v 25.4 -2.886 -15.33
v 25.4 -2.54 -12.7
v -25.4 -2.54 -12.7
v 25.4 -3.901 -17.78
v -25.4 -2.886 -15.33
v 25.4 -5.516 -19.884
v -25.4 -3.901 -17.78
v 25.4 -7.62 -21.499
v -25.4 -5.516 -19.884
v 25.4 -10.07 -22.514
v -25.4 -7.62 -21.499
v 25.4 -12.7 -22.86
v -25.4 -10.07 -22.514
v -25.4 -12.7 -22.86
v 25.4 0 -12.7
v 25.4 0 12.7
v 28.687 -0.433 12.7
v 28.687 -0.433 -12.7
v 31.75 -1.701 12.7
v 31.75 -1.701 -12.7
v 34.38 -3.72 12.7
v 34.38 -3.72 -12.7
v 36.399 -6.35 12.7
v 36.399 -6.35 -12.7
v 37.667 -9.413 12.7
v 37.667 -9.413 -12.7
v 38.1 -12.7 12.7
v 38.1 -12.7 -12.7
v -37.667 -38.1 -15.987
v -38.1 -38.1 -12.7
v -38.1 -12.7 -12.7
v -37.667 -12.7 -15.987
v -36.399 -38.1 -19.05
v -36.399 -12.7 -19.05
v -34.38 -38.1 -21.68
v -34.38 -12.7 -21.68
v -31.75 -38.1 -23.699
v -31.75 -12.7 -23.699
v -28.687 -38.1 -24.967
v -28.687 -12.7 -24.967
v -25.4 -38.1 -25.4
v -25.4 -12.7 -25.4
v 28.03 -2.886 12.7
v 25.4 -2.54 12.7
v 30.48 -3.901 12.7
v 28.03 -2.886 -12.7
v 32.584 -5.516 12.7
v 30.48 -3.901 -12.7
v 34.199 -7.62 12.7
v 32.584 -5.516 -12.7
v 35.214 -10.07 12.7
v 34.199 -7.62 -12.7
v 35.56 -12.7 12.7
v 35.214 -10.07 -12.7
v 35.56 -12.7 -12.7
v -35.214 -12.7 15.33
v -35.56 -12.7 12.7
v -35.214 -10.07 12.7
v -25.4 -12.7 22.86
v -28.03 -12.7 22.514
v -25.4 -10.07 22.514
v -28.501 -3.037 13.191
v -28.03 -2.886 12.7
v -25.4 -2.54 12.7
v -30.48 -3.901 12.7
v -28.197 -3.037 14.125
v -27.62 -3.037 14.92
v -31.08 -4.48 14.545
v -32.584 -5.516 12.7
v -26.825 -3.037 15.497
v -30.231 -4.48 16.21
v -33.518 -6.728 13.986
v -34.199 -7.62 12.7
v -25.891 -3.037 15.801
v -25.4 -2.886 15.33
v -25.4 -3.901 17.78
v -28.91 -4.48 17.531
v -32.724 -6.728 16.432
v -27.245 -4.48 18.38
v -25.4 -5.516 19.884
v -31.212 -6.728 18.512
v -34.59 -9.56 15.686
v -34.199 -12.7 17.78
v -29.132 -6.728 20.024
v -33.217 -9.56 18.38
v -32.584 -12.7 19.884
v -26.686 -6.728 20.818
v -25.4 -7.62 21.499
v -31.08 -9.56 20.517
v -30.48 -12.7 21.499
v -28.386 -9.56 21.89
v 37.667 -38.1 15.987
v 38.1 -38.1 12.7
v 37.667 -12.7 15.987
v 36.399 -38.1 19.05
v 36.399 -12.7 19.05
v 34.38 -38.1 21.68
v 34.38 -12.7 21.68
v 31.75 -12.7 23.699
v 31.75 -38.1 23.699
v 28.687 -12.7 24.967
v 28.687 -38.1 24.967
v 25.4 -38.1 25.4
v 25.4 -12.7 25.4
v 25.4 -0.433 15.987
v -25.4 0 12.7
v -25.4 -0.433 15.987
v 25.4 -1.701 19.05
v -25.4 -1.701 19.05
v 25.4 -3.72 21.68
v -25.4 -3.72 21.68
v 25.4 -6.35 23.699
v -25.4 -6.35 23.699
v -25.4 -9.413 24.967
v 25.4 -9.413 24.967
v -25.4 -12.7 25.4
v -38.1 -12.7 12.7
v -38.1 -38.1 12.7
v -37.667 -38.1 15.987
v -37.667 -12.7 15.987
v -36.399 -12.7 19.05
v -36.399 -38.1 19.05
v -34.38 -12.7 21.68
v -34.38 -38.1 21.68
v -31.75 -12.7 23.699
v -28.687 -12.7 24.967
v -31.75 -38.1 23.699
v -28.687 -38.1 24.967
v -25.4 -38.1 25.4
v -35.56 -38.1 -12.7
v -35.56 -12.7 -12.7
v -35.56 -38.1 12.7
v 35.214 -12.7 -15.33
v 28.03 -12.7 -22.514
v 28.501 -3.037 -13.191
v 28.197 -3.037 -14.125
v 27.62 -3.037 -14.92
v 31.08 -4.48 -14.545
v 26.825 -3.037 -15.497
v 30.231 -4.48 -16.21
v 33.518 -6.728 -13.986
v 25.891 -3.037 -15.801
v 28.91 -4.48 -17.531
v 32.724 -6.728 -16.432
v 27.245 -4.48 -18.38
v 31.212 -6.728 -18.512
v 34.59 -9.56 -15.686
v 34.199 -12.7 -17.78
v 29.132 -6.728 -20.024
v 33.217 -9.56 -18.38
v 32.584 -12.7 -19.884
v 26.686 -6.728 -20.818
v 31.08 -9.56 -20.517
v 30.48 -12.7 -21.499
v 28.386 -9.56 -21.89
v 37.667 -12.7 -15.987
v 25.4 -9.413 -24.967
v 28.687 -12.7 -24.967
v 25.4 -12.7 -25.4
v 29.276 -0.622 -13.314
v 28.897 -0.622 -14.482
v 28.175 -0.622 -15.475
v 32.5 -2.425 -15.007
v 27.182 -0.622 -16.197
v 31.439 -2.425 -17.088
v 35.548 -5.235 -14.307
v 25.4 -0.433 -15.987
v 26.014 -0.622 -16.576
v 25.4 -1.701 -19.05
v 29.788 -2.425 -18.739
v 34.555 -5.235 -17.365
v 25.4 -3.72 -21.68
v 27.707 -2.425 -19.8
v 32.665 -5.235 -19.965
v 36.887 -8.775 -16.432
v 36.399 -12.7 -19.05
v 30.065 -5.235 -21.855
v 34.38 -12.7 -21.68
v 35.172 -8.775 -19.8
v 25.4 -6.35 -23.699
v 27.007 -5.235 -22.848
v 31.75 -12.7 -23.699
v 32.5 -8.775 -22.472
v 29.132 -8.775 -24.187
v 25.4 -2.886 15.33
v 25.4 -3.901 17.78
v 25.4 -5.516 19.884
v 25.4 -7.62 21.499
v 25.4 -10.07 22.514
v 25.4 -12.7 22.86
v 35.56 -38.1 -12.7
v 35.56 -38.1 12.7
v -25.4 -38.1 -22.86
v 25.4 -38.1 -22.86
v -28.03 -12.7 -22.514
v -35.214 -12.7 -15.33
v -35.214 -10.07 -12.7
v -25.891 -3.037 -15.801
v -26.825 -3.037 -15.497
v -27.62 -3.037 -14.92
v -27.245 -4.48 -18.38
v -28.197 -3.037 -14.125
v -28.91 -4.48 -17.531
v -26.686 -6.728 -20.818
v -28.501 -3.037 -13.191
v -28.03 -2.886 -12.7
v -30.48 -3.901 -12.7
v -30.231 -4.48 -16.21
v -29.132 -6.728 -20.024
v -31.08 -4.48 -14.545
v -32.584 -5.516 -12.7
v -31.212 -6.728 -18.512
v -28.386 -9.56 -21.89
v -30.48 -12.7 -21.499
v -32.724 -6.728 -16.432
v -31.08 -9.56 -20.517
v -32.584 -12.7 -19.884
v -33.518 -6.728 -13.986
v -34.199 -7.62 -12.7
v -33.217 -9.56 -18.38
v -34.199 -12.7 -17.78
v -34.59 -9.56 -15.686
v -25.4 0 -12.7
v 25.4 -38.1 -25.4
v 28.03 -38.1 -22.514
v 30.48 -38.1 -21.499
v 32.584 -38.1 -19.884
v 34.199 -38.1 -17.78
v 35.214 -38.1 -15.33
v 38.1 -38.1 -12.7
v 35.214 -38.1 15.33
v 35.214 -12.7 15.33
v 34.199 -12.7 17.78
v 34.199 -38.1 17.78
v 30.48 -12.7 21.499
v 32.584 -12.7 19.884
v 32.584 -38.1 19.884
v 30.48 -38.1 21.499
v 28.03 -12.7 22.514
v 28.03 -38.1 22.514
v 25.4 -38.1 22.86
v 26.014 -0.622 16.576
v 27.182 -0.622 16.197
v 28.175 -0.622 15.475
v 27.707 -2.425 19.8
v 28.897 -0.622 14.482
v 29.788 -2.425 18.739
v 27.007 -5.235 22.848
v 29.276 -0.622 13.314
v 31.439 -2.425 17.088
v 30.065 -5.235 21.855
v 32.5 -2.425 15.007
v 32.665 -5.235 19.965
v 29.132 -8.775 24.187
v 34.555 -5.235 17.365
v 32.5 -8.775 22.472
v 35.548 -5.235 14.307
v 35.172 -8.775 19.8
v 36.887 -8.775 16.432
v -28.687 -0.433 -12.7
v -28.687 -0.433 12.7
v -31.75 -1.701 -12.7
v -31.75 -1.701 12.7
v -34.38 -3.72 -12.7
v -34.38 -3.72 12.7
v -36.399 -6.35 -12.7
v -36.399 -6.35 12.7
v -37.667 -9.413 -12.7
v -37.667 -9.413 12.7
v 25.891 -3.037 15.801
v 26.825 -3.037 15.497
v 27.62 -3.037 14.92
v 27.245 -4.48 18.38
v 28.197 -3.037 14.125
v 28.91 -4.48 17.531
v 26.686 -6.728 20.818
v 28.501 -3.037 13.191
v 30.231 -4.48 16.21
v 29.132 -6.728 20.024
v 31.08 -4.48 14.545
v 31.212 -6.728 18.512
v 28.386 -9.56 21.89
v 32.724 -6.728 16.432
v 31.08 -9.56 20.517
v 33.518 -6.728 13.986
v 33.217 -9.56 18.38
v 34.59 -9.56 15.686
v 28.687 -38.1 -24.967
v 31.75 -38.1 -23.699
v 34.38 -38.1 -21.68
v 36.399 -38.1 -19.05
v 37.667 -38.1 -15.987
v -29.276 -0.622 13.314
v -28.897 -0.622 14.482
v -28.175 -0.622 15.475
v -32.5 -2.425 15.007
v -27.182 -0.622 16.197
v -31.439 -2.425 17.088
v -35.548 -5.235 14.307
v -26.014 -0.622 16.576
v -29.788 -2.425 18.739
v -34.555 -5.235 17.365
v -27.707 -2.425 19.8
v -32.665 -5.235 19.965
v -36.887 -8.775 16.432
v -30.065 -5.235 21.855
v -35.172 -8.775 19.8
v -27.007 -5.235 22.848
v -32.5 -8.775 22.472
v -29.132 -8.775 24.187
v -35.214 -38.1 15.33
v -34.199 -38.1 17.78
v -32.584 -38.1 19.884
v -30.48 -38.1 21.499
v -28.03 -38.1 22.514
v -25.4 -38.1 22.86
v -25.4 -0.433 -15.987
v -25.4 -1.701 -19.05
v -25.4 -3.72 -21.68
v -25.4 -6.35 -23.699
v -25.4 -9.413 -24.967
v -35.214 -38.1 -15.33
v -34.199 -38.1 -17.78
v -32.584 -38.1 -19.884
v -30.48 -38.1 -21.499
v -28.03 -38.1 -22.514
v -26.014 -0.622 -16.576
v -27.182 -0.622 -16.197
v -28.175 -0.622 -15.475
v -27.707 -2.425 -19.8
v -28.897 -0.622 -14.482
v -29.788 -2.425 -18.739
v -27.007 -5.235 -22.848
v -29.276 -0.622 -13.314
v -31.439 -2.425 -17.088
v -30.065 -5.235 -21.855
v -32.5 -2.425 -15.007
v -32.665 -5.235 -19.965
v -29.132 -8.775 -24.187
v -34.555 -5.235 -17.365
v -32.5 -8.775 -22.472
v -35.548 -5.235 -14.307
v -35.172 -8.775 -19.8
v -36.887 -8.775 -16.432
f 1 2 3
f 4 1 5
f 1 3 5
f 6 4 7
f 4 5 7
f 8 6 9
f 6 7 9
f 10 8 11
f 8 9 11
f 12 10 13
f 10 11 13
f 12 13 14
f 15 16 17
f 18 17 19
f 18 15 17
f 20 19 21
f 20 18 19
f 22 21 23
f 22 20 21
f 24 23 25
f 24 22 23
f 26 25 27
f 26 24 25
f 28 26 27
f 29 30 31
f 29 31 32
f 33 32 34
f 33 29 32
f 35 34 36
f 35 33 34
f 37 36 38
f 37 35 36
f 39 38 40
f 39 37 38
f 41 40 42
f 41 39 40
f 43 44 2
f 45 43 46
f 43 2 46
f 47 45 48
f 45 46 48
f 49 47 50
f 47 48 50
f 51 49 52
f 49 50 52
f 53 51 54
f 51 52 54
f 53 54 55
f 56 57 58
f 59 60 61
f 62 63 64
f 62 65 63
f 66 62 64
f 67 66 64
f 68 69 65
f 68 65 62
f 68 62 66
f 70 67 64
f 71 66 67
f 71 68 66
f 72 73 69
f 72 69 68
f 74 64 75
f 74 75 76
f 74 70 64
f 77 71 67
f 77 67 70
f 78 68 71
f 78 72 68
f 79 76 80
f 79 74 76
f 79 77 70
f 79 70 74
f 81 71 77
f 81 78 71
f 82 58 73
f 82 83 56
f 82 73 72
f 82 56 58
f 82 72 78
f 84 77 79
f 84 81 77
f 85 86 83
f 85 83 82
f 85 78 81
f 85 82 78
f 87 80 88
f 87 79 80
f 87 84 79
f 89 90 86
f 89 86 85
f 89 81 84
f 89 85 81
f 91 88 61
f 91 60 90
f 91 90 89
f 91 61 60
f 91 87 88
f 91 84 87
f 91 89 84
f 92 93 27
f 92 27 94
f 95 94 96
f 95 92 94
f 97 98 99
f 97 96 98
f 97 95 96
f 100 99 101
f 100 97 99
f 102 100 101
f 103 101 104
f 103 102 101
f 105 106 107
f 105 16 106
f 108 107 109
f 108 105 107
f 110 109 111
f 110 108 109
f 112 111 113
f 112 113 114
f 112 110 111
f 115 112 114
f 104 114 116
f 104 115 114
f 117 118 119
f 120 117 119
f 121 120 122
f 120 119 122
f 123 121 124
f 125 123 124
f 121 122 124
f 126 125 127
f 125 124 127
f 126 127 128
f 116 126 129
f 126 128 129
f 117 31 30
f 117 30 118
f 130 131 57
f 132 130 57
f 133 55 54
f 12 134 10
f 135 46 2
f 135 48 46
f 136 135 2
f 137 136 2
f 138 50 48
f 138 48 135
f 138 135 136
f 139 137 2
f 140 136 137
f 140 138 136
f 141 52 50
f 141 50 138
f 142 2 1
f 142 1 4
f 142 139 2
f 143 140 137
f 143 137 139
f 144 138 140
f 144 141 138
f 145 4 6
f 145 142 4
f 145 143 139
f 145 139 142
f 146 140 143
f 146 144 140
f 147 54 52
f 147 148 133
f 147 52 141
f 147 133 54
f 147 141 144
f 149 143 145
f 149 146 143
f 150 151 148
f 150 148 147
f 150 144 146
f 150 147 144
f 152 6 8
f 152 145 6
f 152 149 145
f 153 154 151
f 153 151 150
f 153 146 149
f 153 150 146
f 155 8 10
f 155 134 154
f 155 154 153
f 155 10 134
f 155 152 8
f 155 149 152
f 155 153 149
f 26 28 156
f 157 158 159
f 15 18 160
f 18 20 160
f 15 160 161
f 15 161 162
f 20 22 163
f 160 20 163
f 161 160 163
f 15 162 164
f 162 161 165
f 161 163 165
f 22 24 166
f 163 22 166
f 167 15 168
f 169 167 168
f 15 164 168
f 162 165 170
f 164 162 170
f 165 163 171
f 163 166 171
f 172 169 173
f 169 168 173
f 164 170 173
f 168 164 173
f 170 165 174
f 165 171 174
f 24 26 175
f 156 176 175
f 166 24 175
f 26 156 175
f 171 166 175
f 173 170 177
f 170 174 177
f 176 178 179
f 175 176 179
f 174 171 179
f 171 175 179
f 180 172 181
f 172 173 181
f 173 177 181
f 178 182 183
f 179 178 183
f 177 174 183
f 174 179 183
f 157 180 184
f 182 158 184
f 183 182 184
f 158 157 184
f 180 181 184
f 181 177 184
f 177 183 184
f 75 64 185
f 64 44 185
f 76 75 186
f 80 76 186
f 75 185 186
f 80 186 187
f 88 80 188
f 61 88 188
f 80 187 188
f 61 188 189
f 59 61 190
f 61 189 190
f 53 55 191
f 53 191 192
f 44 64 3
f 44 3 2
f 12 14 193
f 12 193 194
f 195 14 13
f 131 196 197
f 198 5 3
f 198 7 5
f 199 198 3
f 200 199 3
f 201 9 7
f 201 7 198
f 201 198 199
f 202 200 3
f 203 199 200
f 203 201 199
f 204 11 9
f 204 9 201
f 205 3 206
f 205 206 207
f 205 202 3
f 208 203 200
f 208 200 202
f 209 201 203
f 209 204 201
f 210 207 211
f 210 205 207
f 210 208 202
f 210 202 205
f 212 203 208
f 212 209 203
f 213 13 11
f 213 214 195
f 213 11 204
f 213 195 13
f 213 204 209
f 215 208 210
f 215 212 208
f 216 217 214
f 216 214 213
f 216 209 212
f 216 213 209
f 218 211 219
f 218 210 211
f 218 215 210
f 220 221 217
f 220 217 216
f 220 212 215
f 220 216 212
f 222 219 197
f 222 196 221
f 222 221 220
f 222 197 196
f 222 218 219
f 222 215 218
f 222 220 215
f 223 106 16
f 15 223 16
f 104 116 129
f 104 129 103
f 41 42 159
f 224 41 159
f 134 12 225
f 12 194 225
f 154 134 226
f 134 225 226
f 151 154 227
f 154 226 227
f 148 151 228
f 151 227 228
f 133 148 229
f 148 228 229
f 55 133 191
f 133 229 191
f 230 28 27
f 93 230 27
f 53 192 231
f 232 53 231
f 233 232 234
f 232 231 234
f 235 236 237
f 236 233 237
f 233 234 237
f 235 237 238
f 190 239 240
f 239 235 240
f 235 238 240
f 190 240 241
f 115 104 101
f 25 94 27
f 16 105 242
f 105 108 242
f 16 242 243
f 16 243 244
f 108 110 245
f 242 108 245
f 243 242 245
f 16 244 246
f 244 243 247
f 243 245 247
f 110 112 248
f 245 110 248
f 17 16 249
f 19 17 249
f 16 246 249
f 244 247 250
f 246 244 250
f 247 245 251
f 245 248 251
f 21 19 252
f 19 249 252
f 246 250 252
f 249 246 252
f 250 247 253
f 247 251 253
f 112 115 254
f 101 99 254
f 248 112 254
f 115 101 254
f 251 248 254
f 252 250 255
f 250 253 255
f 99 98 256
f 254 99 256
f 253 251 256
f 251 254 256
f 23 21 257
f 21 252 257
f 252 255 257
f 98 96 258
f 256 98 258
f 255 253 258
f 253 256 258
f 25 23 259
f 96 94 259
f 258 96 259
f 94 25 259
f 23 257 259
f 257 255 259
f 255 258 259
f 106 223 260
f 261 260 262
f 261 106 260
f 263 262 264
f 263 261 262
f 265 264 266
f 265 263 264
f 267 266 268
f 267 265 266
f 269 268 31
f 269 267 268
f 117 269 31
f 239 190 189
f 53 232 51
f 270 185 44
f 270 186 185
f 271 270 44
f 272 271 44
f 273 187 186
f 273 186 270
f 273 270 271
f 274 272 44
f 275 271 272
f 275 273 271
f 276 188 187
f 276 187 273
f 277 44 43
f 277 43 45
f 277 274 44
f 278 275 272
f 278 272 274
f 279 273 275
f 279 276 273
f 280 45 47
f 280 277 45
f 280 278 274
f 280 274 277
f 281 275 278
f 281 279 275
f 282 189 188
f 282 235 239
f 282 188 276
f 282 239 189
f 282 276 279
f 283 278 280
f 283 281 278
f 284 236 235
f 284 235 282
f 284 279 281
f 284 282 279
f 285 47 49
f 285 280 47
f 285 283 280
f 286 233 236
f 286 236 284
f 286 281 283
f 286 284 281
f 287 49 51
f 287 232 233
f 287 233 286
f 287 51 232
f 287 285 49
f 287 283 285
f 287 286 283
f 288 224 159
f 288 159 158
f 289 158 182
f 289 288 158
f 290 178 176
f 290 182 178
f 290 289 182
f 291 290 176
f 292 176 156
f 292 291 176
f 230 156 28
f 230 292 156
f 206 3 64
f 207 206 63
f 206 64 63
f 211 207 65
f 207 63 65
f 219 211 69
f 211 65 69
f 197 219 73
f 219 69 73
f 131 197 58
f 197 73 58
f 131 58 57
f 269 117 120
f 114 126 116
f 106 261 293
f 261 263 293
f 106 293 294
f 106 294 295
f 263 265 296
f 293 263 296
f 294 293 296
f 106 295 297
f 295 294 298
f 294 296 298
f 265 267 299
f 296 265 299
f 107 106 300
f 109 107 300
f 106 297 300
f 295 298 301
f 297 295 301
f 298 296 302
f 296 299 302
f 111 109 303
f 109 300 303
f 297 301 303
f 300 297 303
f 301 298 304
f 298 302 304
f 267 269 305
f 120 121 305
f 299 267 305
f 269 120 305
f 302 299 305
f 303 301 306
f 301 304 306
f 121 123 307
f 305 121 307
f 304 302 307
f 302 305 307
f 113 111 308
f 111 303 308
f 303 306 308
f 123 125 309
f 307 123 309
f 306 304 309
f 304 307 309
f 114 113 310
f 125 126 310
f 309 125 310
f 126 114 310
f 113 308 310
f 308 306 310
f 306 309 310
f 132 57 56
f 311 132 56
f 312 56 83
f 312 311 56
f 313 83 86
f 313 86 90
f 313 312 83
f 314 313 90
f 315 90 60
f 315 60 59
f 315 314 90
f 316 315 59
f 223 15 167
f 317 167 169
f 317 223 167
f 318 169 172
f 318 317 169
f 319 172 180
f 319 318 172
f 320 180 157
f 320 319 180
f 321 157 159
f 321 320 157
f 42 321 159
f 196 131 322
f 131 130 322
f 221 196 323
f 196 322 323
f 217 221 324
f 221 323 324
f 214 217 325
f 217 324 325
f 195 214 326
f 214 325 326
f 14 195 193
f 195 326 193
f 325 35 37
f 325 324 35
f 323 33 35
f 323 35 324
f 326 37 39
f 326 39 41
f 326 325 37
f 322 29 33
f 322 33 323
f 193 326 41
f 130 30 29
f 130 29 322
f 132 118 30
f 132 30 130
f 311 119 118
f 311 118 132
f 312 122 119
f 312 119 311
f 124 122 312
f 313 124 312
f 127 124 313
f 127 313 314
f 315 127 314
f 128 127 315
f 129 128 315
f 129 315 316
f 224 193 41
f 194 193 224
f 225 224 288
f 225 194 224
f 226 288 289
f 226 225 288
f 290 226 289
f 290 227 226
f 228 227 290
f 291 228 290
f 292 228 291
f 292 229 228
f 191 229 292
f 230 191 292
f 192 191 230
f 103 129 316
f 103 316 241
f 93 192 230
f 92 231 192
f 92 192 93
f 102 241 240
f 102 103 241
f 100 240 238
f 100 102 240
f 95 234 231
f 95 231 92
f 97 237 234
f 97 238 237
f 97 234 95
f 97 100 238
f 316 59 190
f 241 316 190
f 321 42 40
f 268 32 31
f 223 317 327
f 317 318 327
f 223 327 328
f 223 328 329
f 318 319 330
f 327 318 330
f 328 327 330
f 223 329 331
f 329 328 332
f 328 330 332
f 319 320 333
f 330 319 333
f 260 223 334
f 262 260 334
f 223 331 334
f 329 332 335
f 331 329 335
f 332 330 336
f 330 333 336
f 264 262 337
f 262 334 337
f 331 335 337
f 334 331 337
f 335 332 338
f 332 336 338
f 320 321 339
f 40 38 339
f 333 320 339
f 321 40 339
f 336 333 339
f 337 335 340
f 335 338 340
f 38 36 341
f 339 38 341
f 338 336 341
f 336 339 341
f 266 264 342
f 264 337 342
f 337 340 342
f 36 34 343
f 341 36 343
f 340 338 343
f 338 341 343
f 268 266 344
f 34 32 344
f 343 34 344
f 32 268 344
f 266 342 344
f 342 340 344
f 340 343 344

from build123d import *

# Parameters (mm, degrees)
F0_W     = 76.2
F0_H     = 50.8
F1_DEPTH = 38.1
F2_R     = 12.7
F3_R     = 12.7
F4_T     = -2.54


with BuildPart() as f1:
    # F0 (on Front) → F1 (new body)
    with BuildSketch(Plane.XZ):
        Rectangle(F0_W, F0_H)
    extrude(amount=F1_DEPTH)

    # F2
    f2_edges = [f1.edges().sort_by_distance(p)[0] for p in [
        (38.1, -19.05, 25.4),
        (38.1, -19.05, -25.4),
        (-38.1, -19.05, 25.4),
        (-38.1, -19.05, -25.4),
    ]]
    fillet(f2_edges, radius=F2_R)

    # F3
    f3_edges = [f1.edges().sort_by_distance(p)[0] for p in [
        (0, 0, 25.4),
    ]]
    fillet(f3_edges, radius=F3_R)

    # F4
    f4_openings = [f1.faces().sort_by_distance(p)[0] for p in [
        (0, -38.1, 0),
    ]]
    offset(amount=F4_T, openings=f4_openings)


solid = f1.part
